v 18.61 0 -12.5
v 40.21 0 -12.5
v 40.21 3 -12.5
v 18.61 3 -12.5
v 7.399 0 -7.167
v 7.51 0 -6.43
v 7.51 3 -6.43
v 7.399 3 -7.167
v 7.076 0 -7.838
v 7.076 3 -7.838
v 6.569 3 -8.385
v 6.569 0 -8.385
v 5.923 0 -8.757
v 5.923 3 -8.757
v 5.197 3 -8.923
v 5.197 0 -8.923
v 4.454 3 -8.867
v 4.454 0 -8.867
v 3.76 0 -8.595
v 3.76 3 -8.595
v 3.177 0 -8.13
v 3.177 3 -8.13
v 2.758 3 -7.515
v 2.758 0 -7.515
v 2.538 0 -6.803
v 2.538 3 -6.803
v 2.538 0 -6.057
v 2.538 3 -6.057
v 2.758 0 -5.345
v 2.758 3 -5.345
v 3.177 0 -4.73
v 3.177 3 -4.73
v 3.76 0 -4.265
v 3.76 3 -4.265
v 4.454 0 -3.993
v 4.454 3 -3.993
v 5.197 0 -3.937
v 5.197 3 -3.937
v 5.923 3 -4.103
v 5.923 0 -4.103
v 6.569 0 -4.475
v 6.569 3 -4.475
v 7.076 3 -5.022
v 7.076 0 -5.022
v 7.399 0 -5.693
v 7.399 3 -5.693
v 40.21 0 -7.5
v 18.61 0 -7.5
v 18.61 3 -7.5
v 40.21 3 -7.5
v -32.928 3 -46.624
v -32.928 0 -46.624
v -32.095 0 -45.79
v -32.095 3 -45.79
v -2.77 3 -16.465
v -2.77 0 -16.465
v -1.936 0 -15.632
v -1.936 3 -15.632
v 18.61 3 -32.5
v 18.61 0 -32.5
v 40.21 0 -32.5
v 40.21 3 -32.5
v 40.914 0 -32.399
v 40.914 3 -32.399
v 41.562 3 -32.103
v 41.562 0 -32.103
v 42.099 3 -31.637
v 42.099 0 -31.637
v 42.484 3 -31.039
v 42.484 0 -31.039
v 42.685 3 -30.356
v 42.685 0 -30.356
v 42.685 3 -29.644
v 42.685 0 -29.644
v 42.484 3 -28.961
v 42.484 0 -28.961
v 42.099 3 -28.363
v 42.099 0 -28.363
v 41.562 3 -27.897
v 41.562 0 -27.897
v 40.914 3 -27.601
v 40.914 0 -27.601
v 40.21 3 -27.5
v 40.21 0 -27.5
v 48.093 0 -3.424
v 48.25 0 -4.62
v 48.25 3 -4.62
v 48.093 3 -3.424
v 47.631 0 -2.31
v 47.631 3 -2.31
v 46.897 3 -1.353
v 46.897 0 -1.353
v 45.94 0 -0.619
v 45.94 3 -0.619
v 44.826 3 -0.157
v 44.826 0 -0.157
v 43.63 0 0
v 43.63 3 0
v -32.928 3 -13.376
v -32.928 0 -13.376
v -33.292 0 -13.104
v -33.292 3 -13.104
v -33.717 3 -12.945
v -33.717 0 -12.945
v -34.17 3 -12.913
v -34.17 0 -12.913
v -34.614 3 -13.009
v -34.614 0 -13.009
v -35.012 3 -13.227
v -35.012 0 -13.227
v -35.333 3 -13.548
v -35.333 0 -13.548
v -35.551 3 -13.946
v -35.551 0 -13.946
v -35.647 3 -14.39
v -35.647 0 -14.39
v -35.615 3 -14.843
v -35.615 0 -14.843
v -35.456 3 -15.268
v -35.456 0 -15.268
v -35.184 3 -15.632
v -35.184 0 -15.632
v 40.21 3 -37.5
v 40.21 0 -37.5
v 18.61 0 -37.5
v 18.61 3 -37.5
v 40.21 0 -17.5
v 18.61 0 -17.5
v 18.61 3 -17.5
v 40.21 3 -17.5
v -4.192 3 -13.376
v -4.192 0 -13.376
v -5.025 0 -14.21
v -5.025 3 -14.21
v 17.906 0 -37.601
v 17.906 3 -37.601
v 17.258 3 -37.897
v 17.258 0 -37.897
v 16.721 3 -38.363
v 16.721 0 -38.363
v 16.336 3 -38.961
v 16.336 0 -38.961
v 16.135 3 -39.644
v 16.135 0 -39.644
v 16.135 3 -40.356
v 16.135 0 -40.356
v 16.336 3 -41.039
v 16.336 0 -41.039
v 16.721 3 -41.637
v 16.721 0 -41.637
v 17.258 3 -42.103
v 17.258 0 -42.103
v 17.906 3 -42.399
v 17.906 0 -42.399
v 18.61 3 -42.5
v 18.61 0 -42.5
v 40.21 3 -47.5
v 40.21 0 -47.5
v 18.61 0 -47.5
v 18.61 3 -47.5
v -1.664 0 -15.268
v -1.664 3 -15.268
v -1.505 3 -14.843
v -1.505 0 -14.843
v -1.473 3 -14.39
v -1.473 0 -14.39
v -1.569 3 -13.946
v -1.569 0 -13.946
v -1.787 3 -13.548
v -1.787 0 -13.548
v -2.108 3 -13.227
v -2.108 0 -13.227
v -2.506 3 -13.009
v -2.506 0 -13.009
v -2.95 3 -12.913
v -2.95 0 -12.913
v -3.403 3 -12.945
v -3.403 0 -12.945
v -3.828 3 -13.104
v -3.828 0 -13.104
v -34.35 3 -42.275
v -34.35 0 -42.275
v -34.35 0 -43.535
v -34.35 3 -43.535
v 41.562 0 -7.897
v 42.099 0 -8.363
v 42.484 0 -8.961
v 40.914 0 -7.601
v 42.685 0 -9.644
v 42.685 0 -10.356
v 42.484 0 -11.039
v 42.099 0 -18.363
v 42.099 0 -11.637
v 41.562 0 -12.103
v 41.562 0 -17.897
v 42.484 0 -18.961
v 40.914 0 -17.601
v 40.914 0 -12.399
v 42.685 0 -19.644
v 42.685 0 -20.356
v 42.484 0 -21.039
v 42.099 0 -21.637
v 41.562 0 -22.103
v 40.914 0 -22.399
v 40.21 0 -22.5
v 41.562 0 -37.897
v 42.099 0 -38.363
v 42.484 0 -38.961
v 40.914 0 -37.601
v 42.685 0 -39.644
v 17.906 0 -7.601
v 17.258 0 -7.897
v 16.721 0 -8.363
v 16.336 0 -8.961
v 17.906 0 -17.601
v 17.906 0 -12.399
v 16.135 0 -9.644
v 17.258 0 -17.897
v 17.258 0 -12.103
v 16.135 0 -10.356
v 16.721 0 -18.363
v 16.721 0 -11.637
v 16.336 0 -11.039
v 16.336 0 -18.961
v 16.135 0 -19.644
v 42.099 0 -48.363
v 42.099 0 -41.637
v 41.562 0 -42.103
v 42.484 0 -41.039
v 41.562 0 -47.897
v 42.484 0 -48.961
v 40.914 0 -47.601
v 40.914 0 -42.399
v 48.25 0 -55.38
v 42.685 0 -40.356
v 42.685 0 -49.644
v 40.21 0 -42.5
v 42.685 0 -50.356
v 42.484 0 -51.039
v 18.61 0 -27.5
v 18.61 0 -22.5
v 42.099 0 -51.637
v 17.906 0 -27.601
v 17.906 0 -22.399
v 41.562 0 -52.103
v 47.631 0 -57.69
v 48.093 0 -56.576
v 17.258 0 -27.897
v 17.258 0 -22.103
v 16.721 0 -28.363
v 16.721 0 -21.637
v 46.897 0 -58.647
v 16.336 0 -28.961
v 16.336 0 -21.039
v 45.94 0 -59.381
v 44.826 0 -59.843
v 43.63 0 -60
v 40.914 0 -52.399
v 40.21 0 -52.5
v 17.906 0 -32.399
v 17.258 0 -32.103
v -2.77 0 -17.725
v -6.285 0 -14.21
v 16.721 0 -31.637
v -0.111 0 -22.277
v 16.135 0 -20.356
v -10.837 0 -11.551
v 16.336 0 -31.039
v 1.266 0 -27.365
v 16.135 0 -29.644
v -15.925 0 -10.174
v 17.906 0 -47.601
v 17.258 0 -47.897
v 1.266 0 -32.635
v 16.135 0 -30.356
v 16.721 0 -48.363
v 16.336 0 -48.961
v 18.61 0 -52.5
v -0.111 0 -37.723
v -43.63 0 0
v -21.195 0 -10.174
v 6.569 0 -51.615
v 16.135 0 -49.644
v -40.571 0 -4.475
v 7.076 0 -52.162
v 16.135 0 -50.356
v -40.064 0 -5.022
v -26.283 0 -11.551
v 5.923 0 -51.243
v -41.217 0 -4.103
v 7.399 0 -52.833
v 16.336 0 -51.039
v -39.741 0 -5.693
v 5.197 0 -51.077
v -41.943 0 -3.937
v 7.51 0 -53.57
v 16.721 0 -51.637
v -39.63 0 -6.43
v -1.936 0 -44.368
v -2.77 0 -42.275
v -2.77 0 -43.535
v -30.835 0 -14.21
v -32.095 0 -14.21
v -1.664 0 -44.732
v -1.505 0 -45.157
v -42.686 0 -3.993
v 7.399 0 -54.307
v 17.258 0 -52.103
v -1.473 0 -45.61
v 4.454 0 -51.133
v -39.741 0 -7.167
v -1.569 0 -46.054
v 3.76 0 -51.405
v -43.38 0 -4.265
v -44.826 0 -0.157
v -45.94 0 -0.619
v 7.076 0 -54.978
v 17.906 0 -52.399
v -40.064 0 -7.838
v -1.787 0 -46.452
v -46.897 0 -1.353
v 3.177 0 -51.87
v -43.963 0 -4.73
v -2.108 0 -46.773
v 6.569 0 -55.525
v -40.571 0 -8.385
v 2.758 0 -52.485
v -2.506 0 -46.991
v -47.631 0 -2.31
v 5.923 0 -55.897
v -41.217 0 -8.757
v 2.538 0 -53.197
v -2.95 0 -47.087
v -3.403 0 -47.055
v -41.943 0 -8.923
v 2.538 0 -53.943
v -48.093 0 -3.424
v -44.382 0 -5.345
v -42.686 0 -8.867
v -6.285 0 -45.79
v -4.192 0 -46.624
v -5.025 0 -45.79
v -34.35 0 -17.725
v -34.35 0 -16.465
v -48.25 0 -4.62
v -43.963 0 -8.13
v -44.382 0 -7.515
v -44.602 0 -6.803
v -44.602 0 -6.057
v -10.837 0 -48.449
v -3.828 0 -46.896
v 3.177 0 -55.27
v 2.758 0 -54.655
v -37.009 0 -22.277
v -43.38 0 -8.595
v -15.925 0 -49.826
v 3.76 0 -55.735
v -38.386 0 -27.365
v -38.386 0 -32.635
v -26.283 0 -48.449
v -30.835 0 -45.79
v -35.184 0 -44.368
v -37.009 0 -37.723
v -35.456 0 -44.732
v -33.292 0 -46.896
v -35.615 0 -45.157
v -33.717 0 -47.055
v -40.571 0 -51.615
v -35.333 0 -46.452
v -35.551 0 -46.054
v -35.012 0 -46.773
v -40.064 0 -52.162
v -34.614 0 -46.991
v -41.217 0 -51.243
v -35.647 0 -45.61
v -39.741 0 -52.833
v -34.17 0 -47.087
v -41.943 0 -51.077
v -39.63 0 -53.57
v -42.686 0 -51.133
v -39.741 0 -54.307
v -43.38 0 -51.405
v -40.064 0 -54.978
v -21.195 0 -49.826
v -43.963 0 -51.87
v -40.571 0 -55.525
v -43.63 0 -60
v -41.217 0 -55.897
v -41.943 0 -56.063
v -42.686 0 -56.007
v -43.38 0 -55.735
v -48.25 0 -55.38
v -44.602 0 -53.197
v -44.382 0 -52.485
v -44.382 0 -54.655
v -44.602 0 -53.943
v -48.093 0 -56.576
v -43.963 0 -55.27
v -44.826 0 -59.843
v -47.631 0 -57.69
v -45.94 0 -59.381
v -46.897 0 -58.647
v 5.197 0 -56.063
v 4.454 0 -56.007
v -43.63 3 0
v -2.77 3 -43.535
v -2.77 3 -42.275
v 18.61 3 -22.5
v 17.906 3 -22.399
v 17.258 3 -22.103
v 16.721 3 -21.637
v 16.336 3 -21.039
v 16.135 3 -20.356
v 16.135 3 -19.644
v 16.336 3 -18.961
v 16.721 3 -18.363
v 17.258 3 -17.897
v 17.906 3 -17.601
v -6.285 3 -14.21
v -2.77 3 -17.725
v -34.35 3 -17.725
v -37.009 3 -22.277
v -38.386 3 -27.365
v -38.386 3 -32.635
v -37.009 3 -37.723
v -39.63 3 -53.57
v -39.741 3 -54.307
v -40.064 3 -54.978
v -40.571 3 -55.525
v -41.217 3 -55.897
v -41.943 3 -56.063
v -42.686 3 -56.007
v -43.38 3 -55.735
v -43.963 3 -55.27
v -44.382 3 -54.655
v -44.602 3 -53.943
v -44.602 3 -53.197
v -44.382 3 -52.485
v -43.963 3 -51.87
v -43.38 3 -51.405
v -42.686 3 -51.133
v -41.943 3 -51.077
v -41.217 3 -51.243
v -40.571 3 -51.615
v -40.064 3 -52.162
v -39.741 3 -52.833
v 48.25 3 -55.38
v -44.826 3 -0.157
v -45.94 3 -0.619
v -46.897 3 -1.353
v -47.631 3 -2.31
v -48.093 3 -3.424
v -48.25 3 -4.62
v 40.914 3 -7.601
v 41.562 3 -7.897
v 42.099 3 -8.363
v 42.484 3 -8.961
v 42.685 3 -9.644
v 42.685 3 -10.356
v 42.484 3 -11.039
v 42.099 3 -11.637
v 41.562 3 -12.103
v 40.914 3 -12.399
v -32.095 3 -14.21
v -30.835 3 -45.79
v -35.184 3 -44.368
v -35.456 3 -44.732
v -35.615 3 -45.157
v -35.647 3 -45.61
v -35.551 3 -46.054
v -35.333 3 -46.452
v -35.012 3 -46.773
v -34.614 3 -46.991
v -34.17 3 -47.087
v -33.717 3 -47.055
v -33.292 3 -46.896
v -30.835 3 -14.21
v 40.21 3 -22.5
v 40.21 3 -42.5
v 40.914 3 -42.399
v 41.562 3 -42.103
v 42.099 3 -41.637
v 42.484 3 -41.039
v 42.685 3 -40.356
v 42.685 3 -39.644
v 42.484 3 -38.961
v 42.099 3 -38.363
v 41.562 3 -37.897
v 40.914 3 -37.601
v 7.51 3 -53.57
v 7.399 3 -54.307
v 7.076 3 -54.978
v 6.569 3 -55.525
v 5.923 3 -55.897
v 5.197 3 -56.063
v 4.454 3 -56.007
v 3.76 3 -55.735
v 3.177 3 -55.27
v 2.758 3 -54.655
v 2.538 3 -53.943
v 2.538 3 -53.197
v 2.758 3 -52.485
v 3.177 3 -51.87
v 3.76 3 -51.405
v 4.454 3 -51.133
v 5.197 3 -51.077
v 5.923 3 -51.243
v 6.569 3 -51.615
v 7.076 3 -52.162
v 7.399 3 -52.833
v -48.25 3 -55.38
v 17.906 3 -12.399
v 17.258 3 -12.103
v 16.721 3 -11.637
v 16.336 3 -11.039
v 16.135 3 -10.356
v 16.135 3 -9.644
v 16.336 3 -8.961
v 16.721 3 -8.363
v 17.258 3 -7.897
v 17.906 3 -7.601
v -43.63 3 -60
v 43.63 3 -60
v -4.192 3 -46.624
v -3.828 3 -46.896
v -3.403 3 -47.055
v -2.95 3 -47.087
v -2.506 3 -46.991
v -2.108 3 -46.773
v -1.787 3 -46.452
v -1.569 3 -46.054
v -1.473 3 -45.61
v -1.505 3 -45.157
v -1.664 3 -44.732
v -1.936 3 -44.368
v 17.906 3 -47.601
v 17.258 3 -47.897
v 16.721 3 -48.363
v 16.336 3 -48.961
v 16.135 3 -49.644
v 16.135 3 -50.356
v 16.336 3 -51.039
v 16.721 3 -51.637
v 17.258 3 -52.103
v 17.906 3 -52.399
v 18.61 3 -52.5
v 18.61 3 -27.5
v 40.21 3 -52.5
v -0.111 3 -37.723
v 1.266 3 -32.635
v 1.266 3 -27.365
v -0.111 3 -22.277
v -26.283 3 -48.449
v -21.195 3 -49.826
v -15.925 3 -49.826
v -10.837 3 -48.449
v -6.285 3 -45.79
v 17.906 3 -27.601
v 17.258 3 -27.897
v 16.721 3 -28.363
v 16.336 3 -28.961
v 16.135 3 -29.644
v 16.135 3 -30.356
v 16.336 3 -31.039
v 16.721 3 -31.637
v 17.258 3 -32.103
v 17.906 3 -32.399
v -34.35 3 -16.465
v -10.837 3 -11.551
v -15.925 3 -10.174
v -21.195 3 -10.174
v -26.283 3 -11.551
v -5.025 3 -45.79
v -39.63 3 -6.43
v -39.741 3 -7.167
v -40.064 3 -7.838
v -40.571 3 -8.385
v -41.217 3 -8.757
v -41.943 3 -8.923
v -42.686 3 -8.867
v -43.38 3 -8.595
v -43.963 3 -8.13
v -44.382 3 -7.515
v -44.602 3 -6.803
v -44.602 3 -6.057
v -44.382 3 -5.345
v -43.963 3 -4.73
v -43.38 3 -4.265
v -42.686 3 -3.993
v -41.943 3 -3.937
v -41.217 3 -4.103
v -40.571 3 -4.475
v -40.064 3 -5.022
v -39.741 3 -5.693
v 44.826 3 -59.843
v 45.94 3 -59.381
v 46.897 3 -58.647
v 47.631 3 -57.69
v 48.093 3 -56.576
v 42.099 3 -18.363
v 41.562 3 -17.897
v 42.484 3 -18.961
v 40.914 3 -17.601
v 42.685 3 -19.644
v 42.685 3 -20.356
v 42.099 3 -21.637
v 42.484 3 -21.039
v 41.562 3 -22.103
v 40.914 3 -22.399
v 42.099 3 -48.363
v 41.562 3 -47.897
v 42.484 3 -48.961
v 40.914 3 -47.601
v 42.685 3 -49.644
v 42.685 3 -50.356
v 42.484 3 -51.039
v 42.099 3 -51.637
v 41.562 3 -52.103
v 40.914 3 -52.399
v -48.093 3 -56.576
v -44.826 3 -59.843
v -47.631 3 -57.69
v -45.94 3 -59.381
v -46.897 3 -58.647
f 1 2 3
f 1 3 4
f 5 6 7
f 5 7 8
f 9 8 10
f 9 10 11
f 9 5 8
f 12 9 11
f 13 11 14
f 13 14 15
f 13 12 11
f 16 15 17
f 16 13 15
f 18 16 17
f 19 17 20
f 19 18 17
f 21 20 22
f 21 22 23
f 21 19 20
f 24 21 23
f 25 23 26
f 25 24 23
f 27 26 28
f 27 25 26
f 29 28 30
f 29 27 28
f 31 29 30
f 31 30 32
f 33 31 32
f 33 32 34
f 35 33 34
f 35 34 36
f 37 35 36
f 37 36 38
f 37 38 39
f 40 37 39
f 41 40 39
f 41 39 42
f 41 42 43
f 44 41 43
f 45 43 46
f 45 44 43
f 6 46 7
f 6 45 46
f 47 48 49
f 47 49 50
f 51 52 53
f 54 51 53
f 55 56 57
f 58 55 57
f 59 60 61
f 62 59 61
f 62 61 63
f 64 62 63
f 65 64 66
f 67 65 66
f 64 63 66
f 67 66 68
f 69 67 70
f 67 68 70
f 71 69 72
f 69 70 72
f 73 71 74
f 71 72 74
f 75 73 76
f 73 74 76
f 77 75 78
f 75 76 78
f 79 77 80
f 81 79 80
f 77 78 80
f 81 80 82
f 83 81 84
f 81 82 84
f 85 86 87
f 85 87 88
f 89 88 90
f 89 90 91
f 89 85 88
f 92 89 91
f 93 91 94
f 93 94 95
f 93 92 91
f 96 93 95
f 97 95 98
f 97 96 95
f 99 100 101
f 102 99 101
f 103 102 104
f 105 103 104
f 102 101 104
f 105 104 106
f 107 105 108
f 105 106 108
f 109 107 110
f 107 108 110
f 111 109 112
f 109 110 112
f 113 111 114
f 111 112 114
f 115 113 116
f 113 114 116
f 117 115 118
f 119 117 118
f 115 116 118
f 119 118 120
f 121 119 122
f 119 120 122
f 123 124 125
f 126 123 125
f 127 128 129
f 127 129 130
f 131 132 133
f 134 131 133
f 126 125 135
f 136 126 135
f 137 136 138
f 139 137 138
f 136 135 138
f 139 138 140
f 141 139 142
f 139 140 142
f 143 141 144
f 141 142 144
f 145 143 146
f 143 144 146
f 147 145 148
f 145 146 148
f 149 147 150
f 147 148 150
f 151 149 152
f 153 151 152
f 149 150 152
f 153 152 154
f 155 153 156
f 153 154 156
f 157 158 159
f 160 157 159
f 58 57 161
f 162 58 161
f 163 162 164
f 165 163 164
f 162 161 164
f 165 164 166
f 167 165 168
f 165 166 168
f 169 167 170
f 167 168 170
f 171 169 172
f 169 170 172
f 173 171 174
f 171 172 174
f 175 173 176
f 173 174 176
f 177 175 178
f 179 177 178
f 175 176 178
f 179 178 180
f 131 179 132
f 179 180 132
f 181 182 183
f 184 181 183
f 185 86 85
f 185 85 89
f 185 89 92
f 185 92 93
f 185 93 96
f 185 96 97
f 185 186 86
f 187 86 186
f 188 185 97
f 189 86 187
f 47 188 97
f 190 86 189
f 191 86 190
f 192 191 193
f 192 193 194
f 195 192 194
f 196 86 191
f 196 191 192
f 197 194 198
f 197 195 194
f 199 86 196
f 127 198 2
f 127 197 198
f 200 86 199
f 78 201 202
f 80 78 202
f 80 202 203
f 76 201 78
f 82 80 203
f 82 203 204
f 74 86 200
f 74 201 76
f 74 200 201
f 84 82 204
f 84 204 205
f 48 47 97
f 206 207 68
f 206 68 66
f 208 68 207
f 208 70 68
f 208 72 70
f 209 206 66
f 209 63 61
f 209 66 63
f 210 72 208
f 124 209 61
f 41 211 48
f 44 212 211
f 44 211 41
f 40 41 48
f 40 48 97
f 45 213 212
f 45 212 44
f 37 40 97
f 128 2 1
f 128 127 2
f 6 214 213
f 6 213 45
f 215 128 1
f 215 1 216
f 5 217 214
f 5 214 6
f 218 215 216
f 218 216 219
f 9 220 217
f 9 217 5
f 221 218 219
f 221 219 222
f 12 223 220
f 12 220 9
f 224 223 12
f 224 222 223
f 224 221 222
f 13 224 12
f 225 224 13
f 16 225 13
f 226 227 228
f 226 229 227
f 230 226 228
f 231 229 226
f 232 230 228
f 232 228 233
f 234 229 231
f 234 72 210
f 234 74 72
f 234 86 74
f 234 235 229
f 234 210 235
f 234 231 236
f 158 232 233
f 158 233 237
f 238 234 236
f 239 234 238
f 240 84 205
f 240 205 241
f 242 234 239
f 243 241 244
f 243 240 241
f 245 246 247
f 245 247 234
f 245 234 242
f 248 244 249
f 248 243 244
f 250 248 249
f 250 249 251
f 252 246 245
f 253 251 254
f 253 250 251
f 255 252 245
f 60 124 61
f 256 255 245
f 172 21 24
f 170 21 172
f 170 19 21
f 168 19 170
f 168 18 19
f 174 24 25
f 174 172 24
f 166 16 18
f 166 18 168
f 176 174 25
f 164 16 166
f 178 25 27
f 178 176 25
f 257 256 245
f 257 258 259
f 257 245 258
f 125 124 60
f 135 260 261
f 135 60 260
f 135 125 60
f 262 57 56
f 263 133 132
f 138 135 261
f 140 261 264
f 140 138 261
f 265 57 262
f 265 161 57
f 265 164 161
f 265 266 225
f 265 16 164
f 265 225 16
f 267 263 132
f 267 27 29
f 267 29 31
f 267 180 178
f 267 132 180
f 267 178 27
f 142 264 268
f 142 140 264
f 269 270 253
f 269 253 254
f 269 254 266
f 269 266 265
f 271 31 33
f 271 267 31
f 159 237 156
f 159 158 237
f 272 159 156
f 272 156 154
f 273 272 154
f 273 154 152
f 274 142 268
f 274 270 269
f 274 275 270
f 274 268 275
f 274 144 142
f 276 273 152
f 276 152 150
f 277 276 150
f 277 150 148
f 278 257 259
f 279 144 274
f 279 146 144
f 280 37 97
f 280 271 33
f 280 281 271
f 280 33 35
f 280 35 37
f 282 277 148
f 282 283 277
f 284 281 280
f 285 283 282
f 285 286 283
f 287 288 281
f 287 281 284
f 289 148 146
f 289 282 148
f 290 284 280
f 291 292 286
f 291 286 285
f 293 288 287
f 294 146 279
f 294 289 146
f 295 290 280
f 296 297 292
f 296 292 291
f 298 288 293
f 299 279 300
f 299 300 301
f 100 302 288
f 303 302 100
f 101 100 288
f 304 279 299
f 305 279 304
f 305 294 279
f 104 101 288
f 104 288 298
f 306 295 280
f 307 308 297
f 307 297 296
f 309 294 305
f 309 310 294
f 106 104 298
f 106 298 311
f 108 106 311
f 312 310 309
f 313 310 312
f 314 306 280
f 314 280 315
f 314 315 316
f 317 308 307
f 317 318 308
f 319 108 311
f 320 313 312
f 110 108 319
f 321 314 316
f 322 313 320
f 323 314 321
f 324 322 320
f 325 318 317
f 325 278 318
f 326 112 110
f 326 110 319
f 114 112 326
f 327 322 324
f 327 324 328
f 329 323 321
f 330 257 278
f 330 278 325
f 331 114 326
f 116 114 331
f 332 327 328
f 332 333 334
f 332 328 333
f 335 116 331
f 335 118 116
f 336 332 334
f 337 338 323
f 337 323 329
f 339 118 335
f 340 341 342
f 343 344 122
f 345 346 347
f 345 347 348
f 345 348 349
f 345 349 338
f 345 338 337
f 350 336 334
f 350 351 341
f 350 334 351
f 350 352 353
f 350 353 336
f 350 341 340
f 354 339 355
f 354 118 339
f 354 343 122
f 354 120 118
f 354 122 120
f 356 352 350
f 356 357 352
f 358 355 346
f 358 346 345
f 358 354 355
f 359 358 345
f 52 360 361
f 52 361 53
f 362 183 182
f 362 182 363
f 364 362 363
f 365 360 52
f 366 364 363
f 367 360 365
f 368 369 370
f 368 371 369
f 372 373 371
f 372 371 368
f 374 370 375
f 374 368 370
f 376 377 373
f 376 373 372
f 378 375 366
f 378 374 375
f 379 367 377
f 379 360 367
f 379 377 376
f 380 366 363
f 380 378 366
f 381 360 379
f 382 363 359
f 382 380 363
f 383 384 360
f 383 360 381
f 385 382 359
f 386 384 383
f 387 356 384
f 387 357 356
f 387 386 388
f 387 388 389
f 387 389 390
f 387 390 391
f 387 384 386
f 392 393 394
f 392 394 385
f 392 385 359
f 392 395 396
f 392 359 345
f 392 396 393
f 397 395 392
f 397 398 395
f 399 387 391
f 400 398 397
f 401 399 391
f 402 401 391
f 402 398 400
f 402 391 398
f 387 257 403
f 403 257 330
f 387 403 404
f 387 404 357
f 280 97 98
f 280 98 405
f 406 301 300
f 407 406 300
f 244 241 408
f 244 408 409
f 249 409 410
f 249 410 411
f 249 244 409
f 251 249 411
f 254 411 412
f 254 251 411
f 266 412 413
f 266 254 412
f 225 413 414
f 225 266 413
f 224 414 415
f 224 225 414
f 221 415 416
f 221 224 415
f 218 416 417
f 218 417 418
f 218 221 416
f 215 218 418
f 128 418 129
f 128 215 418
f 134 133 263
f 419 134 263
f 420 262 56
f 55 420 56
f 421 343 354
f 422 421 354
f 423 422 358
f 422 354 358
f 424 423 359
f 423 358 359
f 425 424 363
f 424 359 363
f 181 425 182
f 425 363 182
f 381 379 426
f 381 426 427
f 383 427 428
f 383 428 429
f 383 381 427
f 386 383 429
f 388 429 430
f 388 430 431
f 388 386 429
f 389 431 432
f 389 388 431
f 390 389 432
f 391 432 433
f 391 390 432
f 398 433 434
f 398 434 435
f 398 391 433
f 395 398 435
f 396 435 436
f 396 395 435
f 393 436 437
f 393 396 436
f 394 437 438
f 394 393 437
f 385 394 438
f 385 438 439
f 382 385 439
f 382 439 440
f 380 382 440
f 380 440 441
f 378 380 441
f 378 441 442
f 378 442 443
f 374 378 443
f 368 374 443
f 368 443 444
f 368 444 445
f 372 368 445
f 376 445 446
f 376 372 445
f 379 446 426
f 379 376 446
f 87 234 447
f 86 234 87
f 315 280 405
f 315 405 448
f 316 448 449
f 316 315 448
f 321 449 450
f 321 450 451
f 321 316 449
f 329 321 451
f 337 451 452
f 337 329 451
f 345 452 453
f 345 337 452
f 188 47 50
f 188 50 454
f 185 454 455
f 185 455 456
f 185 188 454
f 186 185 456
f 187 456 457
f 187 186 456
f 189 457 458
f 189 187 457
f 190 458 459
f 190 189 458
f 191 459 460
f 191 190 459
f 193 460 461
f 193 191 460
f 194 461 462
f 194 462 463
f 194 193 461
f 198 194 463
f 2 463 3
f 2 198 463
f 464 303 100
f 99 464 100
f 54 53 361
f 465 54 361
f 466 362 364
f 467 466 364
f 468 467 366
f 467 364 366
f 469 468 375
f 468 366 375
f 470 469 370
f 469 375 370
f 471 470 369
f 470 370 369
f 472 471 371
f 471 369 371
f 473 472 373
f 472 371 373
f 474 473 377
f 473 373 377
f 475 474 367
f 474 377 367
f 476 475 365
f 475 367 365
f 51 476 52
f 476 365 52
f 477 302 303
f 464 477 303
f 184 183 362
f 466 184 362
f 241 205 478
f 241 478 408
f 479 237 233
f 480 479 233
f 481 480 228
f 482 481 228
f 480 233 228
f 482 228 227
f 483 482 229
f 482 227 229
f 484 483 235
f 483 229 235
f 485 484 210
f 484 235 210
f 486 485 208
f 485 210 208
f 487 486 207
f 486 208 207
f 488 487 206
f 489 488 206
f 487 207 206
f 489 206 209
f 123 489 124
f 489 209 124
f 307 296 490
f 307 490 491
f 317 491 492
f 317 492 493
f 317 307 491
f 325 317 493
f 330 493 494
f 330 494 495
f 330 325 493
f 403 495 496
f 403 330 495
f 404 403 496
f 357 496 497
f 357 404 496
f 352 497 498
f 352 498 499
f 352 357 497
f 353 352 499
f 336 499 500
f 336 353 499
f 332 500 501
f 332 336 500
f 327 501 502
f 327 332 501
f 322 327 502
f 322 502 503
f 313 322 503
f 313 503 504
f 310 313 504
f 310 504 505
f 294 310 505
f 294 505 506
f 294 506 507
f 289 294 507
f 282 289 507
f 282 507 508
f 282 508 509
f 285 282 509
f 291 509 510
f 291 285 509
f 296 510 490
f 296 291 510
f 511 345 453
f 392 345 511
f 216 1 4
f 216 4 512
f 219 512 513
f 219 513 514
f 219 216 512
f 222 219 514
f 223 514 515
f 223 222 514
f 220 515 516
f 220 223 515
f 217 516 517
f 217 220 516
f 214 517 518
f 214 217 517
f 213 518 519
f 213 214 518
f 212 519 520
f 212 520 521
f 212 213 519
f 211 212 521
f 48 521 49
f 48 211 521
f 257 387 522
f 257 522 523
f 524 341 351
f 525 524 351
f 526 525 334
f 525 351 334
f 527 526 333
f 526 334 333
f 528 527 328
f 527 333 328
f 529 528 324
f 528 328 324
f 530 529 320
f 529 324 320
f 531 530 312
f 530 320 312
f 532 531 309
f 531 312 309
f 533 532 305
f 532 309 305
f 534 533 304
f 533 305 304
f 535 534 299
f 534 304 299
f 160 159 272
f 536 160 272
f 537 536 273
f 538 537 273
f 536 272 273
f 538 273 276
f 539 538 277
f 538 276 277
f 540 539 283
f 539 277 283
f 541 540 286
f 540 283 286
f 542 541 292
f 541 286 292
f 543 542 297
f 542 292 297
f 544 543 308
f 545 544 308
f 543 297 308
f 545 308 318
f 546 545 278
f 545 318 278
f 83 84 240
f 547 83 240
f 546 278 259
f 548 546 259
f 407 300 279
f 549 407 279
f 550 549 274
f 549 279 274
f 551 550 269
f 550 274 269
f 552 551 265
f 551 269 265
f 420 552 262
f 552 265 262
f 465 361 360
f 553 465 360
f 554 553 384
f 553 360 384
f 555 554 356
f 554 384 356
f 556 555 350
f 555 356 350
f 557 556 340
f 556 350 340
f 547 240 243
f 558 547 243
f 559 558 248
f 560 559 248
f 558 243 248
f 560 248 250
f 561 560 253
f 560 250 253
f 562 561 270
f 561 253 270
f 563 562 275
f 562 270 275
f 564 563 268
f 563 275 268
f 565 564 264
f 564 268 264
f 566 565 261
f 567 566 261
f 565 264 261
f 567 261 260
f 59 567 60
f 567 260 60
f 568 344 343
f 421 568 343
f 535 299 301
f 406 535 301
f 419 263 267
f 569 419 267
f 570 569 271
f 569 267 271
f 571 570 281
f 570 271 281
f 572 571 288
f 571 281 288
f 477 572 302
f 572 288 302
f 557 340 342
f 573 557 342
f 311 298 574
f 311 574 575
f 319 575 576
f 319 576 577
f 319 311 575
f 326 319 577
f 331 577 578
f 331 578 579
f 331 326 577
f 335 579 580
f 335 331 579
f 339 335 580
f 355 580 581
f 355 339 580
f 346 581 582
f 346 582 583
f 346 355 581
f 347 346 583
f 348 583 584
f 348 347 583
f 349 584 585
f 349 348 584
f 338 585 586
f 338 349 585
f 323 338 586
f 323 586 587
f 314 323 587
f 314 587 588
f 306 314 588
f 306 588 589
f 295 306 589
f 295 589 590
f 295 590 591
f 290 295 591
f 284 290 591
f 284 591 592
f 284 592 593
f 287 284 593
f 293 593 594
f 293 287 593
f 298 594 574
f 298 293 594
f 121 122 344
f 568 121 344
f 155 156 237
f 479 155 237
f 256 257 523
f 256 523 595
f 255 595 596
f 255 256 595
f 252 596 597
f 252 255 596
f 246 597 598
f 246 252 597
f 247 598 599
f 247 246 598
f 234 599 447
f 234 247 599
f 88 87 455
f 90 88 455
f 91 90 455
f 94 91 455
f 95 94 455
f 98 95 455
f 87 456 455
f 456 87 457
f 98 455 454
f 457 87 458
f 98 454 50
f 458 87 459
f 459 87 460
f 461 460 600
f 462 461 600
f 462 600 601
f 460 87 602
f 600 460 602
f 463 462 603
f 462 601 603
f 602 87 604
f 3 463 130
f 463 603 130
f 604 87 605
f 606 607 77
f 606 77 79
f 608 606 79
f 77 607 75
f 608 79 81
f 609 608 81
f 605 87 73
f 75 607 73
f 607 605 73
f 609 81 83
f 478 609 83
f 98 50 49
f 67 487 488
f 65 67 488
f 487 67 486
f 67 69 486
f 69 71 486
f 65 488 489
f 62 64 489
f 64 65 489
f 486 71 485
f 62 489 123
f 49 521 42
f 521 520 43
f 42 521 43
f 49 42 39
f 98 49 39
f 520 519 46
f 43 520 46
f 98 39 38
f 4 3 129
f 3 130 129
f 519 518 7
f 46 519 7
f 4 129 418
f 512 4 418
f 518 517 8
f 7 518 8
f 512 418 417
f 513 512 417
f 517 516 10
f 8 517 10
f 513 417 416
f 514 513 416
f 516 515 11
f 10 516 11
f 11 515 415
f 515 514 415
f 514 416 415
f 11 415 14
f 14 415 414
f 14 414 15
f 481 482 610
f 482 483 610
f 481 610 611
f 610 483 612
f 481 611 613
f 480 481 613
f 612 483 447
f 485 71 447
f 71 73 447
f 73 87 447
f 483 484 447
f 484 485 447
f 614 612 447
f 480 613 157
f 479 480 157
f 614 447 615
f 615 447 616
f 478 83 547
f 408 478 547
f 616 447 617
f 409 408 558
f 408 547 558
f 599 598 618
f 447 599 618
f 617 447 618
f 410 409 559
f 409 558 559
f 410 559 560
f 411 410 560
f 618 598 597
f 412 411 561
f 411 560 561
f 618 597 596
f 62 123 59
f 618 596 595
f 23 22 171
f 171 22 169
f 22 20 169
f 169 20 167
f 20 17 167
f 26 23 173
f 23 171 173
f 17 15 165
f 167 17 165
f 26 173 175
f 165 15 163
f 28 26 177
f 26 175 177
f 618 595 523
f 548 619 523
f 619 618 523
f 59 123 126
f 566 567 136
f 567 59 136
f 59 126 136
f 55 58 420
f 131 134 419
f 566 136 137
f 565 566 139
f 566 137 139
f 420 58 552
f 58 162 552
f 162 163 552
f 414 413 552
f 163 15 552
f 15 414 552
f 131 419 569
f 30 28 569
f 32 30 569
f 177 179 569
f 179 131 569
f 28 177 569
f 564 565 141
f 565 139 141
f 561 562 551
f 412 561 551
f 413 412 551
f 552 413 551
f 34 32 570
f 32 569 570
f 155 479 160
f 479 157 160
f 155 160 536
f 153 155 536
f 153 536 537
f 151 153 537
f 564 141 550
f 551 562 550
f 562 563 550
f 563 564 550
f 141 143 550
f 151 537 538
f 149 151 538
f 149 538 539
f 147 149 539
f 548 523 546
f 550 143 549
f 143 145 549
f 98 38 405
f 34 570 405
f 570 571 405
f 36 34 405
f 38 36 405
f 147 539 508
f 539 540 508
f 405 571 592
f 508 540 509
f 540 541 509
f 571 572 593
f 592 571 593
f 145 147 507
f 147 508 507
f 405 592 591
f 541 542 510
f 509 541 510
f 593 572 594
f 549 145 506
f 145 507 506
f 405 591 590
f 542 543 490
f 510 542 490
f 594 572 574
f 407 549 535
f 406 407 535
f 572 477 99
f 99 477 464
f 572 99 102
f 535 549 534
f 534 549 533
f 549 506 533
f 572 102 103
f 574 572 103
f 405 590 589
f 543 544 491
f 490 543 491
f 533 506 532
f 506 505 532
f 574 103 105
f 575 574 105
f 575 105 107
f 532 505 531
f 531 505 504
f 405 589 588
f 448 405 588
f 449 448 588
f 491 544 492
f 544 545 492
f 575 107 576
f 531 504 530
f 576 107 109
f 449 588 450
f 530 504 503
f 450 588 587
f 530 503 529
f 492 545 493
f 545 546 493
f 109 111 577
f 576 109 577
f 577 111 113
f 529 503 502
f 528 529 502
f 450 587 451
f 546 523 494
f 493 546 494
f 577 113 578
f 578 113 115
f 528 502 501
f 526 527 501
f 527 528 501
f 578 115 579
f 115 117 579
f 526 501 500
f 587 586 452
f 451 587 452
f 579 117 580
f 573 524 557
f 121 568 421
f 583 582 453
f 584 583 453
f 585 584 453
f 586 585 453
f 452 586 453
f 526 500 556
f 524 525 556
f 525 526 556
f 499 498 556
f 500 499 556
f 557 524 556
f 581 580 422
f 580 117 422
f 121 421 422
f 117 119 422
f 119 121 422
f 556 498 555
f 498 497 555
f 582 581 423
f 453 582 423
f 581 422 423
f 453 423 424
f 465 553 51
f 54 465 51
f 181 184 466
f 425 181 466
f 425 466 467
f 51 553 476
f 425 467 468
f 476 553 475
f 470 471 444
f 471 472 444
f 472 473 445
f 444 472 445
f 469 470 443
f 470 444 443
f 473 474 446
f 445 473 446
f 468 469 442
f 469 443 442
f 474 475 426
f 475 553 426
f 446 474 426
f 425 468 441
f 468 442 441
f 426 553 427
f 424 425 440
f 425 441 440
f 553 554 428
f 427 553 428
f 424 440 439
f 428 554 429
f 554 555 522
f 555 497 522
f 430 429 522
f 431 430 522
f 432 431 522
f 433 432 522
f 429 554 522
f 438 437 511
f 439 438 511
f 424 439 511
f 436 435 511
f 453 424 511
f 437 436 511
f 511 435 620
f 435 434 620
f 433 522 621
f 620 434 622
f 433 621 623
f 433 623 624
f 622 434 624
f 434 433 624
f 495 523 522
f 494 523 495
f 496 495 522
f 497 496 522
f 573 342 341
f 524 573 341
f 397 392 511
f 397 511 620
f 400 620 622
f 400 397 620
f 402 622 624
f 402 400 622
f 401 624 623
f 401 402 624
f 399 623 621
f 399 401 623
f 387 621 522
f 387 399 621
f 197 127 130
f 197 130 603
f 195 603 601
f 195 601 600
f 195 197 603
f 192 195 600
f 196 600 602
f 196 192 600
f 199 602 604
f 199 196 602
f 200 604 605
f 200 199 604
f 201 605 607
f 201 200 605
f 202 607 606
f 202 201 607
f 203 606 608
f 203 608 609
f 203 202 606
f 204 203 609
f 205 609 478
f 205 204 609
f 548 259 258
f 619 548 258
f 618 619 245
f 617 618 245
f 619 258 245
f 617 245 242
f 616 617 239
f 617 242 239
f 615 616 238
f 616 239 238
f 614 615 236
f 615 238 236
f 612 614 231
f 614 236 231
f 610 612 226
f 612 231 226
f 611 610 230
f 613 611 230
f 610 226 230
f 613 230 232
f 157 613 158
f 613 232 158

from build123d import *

# Parameters (mm, degrees)
SKETCH2_R           = 2.5
BOSS_EXTRUDE1_DEPTH = 3


with BuildPart() as part:
    # Sketch2 → Boss-Extrude1 (new body)
    with BuildSketch(Plane(origin=(0, 0, 0), x_dir=(1, 0, 0), z_dir=(0, 1, 0))):
        with BuildLine():
            Line((-43.63, 60), (43.63, 60))
            ThreePointArc((43.63, 60), (46.896833329, 58.646833329), (48.25, 55.38))
            Line((48.25, 55.38), (48.25, 4.62))
            ThreePointArc((48.25, 4.62), (46.896833329, 1.353166671), (43.63, 0))
            Line((43.63, 0), (-43.63, 0))
            ThreePointArc((-43.63, 0), (-46.896833329, 1.353166671), (-48.25, 4.62))
            Line((-48.25, 4.62), (-48.25, 55.38))
            ThreePointArc((-48.25, 55.38), (-46.896833329, 58.646833329), (-43.63, 60))
        make_face()
        with Locations((-42.13, 6.43)):
            Circle(SKETCH2_R, mode=Mode.SUBTRACT)
        with Locations((-42.13, 53.57)):
            Circle(SKETCH2_R, mode=Mode.SUBTRACT)
        with Locations((5.01, 53.57)):
            Circle(SKETCH2_R, mode=Mode.SUBTRACT)
        with Locations((5.01, 6.43)):
            Circle(SKETCH2_R, mode=Mode.SUBTRACT)
        with BuildLine():
            Line((18.61, 52.5), (40.21, 52.5))
            ThreePointArc((40.21, 52.5), (42.71, 50), (40.21, 47.5))
            Line((40.21, 47.5), (18.61, 47.5))
            ThreePointArc((18.61, 47.5), (16.11, 50), (18.61, 52.5))
        make_face(mode=Mode.SUBTRACT)
        with BuildLine():
            Line((18.61, 7.5), (40.21, 7.5))
            ThreePointArc((40.21, 7.5), (42.71, 10), (40.21, 12.5))
            Line((40.21, 12.5), (18.61, 12.5))
            ThreePointArc((18.61, 12.5), (16.11, 10), (18.61, 7.5))
        make_face(mode=Mode.SUBTRACT)
        with BuildLine():
            Line((18.61, 32.5), (40.21, 32.5))
            ThreePointArc((40.21, 32.5), (42.71, 30), (40.21, 27.5))
            Line((40.21, 27.5), (18.61, 27.5))
            ThreePointArc((18.61, 27.5), (16.11, 30), (18.61, 32.5))
        make_face(mode=Mode.SUBTRACT)
        with BuildLine():
            Line((18.61, 42.5), (40.21, 42.5))
            ThreePointArc((40.21, 42.5), (42.71, 40), (40.21, 37.5))
            Line((40.21, 37.5), (18.61, 37.5))
            ThreePointArc((18.61, 37.5), (16.11, 40), (18.61, 42.5))
        make_face(mode=Mode.SUBTRACT)
        with BuildLine():
            Line((18.61, 17.5), (40.21, 17.5))
            ThreePointArc((40.21, 17.5), (42.71, 20), (40.21, 22.5))
            Line((40.21, 22.5), (18.61, 22.5))
            ThreePointArc((18.61, 22.5), (16.11, 20), (18.61, 17.5))
        make_face(mode=Mode.SUBTRACT)
        with BuildLine():
            Line((-5.025372417, 45.790298215), (-4.191590206, 46.624080426))
            ThreePointArc((-4.191590206, 46.624080426), (-1.935919574, 46.624080426), (-1.935919574, 44.368409794))
            Line((-1.935919574, 44.368409794), (-2.769701785, 43.534627583))
            Line((-2.769701785, 43.534627583), (-2.769701785, 42.274627583))
            ThreePointArc((-2.769701785, 42.274627583), (1.44, 30), (-2.769701785, 17.725372417))
            Line((-2.769701785, 17.725372417), (-2.769701785, 16.465372417))
            Line((-2.769701785, 16.465372417), (-1.935919574, 15.631590206))
            ThreePointArc((-1.935919574, 15.631590206), (-1.935919574, 13.375919574), (-4.191590206, 13.375919574))
            Line((-4.191590206, 13.375919574), (-5.025372417, 14.209701785))
            Line((-5.025372417, 14.209701785), (-6.285372417, 14.209701785))
            ThreePointArc((-6.285372417, 14.209701785), (-18.56, 10), (-30.834627583, 14.209701785))
            Line((-30.834627583, 14.209701785), (-32.094627583, 14.209701785))
            Line((-32.094627583, 14.209701785), (-32.928409794, 13.375919574))
            ThreePointArc((-32.928409794, 13.375919574), (-35.184080426, 13.375919574), (-35.184080426, 15.631590206))
            Line((-35.184080426, 15.631590206), (-34.350298215, 16.465372417))
            Line((-34.350298215, 16.465372417), (-34.350298215, 17.725372417))
            ThreePointArc((-34.350298215, 17.725372417), (-38.56, 30), (-34.350298215, 42.274627583))
            Line((-34.350298215, 42.274627583), (-34.350298215, 43.534627583))
            Line((-34.350298215, 43.534627583), (-35.184080426, 44.368409794))
            ThreePointArc((-35.184080426, 44.368409794), (-35.184080426, 46.624080426), (-32.928409794, 46.624080426))
            Line((-32.928409794, 46.624080426), (-32.094627583, 45.790298215))
            Line((-32.094627583, 45.790298215), (-30.834627583, 45.790298215))
            ThreePointArc((-30.834627583, 45.790298215), (-18.56, 50), (-6.285372417, 45.790298215))
            Line((-6.285372417, 45.790298215), (-5.025372417, 45.790298215))
        make_face(mode=Mode.SUBTRACT)
    extrude(amount=BOSS_EXTRUDE1_DEPTH)


solid = part.part
